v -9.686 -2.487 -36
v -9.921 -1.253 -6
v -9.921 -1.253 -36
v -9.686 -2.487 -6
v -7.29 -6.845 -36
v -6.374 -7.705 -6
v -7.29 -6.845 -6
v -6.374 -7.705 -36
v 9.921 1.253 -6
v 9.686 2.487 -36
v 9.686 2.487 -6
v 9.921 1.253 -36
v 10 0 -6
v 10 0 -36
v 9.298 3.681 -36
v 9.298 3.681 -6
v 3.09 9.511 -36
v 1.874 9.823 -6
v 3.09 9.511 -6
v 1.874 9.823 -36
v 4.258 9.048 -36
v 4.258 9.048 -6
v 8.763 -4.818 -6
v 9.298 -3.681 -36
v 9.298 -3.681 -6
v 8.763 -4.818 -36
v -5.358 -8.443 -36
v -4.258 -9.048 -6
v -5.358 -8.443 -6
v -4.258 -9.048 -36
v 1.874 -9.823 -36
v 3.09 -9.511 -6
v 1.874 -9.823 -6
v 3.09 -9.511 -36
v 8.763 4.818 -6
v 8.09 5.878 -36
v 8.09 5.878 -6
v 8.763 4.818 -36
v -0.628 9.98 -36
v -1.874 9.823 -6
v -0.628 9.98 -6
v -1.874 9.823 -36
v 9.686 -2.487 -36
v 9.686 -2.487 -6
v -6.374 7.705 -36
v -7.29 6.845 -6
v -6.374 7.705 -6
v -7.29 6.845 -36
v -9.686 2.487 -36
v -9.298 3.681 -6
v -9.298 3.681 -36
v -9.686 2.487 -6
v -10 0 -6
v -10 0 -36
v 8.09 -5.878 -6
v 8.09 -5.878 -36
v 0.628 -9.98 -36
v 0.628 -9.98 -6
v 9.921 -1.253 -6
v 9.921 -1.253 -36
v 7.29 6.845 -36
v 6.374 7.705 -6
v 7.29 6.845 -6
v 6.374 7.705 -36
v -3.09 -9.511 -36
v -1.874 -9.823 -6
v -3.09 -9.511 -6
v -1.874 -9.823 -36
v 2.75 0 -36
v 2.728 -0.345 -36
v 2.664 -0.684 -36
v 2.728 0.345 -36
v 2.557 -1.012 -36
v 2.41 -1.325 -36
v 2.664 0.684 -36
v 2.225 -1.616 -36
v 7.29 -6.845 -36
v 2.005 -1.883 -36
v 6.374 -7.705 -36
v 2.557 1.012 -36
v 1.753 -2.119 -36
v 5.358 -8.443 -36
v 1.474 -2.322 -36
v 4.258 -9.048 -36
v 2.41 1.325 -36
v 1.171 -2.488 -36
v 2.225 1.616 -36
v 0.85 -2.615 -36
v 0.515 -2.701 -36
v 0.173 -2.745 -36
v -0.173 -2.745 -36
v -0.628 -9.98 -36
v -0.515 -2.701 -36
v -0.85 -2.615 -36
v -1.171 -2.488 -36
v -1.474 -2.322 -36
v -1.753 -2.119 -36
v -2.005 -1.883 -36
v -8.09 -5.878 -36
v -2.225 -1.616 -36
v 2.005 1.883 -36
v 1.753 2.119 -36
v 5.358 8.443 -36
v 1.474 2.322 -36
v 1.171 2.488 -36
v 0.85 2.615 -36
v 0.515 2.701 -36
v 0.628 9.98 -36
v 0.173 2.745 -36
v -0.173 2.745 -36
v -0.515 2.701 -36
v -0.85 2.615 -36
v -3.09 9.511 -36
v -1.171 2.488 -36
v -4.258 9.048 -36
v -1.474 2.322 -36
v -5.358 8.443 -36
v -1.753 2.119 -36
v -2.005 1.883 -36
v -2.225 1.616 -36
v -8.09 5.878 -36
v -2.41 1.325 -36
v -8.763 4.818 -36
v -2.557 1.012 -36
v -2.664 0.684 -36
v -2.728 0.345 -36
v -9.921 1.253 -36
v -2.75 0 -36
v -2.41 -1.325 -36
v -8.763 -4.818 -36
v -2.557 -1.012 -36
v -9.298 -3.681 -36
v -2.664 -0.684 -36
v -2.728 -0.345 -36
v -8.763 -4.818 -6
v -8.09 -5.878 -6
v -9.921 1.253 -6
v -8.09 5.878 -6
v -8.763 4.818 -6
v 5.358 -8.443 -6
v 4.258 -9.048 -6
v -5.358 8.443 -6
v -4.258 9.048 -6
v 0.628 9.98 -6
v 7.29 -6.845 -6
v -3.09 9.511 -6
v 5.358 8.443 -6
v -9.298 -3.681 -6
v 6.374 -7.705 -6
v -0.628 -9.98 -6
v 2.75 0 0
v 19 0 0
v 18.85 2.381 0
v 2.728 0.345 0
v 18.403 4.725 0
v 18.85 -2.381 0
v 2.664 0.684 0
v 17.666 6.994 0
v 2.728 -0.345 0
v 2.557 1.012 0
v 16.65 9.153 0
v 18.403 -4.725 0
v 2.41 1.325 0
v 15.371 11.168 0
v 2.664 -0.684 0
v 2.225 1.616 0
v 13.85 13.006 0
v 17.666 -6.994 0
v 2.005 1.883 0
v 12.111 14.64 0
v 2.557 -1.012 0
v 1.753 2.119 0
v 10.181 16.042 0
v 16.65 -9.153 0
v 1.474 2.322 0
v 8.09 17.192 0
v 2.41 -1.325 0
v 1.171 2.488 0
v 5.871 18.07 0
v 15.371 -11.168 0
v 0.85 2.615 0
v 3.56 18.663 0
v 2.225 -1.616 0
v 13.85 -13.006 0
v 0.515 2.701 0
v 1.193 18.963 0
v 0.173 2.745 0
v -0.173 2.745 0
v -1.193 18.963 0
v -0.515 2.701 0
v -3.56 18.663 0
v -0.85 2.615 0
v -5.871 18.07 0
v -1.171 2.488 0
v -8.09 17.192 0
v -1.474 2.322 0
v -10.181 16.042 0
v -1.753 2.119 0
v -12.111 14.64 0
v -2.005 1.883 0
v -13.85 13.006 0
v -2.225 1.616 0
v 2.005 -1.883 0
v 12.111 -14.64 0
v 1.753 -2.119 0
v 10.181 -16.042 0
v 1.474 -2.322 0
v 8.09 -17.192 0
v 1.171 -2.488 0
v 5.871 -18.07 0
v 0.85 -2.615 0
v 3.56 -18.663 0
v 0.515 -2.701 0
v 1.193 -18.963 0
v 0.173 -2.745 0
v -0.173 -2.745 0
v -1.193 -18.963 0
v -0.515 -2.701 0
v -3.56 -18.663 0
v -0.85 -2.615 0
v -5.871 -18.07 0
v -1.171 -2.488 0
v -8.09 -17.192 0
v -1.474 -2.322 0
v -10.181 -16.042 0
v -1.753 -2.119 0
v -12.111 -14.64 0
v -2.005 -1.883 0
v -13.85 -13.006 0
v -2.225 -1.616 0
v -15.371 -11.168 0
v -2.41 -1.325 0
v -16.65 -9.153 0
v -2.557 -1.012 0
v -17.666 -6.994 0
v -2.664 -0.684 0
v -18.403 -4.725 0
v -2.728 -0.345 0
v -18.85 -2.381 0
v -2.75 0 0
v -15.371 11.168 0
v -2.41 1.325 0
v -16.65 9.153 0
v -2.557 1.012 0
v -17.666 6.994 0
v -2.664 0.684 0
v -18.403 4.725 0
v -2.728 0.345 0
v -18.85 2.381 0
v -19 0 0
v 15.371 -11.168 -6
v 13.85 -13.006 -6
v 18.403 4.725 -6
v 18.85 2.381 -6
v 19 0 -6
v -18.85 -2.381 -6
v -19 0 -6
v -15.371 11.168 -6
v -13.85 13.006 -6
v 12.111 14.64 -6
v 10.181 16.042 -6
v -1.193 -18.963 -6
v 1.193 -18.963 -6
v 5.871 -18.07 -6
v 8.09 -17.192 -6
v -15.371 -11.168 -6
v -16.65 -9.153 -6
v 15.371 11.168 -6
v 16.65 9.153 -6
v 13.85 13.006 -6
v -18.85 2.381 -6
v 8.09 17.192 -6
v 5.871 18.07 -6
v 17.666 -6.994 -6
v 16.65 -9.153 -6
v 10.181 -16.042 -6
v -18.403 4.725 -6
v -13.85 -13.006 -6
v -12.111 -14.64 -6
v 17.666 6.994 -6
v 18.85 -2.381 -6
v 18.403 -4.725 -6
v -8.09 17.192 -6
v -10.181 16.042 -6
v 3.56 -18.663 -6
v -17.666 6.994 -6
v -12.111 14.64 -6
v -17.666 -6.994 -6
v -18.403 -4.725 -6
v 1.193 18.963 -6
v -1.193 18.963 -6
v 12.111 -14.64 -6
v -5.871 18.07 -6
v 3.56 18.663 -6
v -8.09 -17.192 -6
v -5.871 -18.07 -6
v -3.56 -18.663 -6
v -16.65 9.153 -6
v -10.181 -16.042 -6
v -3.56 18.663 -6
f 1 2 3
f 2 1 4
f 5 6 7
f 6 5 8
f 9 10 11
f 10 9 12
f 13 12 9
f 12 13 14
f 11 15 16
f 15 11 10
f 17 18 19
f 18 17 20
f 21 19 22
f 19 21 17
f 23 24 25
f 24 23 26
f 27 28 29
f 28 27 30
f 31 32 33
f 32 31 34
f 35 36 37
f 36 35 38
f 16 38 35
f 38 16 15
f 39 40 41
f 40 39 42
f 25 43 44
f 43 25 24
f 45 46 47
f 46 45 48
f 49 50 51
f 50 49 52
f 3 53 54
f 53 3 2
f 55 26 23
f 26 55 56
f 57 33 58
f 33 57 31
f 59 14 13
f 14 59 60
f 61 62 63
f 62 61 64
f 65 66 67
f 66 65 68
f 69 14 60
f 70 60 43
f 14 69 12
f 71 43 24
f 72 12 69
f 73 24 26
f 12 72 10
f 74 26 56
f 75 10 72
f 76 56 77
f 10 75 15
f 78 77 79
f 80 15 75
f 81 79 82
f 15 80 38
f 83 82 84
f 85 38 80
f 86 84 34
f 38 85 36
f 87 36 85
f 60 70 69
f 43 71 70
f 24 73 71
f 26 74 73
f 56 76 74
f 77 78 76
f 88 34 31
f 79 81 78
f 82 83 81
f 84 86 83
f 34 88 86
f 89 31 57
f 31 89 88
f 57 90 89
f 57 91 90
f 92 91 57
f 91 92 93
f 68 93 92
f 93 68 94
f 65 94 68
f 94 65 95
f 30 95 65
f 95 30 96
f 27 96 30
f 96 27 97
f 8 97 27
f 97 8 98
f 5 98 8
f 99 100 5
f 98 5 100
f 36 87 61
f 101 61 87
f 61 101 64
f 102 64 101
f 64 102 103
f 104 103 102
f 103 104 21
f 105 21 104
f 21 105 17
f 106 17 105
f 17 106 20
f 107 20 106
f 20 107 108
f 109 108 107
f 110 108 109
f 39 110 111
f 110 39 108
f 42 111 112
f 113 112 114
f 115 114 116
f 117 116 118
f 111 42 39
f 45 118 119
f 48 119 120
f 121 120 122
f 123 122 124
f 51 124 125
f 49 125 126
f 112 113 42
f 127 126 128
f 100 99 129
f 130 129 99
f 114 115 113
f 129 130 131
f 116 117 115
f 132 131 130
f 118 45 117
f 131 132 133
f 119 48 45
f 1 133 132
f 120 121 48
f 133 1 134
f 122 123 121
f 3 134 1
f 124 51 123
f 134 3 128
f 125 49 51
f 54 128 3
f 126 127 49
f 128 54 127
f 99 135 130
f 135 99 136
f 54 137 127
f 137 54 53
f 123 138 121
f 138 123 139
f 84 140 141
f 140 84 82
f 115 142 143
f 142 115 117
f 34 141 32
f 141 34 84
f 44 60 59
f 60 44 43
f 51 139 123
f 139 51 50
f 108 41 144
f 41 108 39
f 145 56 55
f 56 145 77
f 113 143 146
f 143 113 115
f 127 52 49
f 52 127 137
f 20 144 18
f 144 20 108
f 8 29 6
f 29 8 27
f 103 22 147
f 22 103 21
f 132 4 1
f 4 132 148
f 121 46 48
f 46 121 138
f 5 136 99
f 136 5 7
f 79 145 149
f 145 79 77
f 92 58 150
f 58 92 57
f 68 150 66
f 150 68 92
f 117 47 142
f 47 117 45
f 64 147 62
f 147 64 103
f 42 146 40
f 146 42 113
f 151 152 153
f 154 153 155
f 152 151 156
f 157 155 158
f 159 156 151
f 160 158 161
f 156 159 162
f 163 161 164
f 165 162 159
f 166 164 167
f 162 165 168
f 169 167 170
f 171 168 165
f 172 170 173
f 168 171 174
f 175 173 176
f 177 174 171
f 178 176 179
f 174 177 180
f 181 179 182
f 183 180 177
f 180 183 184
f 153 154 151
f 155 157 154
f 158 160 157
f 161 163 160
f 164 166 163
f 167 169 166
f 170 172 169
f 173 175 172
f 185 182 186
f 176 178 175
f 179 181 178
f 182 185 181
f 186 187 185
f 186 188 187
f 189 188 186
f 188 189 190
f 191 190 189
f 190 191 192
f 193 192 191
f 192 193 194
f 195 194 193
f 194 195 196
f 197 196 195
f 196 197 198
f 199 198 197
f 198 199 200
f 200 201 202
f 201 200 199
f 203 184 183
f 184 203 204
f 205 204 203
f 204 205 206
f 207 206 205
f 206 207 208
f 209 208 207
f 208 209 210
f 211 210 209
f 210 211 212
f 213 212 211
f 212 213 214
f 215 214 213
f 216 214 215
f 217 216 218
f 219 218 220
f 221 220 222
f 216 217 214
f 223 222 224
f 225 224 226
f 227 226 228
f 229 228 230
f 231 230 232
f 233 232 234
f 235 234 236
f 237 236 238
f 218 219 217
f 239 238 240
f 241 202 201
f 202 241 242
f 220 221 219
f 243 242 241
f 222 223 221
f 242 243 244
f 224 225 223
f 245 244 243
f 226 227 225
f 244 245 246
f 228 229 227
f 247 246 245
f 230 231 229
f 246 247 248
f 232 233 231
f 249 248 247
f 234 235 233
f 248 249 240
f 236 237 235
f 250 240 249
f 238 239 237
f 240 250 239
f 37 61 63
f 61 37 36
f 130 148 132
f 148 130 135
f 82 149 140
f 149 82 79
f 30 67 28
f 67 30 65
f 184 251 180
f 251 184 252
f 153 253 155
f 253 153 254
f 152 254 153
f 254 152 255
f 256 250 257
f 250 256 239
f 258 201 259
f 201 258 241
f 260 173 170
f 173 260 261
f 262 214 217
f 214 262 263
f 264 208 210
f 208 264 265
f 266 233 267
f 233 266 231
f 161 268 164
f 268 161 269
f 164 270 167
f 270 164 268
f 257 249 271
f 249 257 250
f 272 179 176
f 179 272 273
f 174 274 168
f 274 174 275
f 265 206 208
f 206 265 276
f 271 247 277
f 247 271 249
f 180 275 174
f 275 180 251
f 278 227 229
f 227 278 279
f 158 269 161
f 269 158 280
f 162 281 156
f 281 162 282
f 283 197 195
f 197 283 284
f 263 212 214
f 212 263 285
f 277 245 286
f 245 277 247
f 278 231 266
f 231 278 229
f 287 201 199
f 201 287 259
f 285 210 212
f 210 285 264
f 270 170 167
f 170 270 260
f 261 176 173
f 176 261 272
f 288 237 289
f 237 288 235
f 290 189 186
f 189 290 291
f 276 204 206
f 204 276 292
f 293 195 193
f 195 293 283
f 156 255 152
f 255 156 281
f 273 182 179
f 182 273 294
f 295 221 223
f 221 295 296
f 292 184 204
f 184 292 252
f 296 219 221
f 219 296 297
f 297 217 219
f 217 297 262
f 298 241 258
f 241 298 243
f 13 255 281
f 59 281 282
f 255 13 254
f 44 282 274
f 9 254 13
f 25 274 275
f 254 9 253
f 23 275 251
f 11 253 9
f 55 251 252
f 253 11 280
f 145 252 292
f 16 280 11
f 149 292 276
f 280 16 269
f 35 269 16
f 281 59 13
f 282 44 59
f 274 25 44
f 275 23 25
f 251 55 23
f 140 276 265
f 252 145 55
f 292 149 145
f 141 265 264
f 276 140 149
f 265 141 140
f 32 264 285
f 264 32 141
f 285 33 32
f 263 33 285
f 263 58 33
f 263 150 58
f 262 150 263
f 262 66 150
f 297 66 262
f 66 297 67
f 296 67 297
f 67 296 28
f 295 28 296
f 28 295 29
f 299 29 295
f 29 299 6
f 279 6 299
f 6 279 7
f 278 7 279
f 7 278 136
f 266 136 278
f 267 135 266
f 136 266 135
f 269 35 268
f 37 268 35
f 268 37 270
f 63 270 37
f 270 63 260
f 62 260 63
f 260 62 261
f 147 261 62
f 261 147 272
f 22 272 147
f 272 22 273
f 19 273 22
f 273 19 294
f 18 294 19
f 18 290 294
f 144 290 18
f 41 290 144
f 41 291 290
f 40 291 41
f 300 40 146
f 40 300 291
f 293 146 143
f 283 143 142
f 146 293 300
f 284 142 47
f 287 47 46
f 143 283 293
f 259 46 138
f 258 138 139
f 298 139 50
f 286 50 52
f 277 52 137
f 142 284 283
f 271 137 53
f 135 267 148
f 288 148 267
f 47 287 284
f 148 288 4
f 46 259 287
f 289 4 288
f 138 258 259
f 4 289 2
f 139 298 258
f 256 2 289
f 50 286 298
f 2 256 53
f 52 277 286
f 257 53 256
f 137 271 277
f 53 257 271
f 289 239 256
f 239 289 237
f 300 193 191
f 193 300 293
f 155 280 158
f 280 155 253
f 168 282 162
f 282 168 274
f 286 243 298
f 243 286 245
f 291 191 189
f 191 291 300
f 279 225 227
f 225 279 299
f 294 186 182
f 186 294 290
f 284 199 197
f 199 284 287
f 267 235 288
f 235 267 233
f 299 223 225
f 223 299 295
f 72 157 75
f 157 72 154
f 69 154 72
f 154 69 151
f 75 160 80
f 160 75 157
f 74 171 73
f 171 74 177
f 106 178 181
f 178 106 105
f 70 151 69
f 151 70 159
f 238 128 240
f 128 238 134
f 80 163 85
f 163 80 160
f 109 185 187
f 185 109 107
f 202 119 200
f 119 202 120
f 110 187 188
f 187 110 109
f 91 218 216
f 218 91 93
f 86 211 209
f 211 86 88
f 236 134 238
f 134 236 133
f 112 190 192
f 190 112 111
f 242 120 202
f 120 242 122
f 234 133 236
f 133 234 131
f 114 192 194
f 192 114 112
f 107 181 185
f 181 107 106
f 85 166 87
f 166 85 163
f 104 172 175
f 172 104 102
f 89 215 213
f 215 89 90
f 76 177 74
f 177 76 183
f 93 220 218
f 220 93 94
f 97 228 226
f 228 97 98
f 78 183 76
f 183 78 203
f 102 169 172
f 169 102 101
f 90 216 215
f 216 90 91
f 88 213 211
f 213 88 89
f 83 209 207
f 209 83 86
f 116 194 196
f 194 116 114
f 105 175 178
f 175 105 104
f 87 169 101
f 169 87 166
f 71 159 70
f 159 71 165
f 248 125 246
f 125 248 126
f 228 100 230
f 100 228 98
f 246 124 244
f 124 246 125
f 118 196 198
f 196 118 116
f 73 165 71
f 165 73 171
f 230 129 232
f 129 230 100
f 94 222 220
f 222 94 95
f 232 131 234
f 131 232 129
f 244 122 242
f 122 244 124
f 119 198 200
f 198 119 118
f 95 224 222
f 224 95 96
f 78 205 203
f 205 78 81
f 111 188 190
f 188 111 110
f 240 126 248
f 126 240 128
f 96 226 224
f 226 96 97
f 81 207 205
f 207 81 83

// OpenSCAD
$fn = 50;


difference() {
	union() {
		translate(v = [0, 0, -36.0000000000]) {
			cylinder(h = 36, r = 10.0000000000);
		}
		translate(v = [0, 0, -6.0000000000]) {
			cylinder(h = 6, r = 19.0000000000);
		}
	}
	union() {
		#translate(v = [0, 0, -36]) {
			cylinder(h = 36, r = 2.7500000000);
		}
	}
}
